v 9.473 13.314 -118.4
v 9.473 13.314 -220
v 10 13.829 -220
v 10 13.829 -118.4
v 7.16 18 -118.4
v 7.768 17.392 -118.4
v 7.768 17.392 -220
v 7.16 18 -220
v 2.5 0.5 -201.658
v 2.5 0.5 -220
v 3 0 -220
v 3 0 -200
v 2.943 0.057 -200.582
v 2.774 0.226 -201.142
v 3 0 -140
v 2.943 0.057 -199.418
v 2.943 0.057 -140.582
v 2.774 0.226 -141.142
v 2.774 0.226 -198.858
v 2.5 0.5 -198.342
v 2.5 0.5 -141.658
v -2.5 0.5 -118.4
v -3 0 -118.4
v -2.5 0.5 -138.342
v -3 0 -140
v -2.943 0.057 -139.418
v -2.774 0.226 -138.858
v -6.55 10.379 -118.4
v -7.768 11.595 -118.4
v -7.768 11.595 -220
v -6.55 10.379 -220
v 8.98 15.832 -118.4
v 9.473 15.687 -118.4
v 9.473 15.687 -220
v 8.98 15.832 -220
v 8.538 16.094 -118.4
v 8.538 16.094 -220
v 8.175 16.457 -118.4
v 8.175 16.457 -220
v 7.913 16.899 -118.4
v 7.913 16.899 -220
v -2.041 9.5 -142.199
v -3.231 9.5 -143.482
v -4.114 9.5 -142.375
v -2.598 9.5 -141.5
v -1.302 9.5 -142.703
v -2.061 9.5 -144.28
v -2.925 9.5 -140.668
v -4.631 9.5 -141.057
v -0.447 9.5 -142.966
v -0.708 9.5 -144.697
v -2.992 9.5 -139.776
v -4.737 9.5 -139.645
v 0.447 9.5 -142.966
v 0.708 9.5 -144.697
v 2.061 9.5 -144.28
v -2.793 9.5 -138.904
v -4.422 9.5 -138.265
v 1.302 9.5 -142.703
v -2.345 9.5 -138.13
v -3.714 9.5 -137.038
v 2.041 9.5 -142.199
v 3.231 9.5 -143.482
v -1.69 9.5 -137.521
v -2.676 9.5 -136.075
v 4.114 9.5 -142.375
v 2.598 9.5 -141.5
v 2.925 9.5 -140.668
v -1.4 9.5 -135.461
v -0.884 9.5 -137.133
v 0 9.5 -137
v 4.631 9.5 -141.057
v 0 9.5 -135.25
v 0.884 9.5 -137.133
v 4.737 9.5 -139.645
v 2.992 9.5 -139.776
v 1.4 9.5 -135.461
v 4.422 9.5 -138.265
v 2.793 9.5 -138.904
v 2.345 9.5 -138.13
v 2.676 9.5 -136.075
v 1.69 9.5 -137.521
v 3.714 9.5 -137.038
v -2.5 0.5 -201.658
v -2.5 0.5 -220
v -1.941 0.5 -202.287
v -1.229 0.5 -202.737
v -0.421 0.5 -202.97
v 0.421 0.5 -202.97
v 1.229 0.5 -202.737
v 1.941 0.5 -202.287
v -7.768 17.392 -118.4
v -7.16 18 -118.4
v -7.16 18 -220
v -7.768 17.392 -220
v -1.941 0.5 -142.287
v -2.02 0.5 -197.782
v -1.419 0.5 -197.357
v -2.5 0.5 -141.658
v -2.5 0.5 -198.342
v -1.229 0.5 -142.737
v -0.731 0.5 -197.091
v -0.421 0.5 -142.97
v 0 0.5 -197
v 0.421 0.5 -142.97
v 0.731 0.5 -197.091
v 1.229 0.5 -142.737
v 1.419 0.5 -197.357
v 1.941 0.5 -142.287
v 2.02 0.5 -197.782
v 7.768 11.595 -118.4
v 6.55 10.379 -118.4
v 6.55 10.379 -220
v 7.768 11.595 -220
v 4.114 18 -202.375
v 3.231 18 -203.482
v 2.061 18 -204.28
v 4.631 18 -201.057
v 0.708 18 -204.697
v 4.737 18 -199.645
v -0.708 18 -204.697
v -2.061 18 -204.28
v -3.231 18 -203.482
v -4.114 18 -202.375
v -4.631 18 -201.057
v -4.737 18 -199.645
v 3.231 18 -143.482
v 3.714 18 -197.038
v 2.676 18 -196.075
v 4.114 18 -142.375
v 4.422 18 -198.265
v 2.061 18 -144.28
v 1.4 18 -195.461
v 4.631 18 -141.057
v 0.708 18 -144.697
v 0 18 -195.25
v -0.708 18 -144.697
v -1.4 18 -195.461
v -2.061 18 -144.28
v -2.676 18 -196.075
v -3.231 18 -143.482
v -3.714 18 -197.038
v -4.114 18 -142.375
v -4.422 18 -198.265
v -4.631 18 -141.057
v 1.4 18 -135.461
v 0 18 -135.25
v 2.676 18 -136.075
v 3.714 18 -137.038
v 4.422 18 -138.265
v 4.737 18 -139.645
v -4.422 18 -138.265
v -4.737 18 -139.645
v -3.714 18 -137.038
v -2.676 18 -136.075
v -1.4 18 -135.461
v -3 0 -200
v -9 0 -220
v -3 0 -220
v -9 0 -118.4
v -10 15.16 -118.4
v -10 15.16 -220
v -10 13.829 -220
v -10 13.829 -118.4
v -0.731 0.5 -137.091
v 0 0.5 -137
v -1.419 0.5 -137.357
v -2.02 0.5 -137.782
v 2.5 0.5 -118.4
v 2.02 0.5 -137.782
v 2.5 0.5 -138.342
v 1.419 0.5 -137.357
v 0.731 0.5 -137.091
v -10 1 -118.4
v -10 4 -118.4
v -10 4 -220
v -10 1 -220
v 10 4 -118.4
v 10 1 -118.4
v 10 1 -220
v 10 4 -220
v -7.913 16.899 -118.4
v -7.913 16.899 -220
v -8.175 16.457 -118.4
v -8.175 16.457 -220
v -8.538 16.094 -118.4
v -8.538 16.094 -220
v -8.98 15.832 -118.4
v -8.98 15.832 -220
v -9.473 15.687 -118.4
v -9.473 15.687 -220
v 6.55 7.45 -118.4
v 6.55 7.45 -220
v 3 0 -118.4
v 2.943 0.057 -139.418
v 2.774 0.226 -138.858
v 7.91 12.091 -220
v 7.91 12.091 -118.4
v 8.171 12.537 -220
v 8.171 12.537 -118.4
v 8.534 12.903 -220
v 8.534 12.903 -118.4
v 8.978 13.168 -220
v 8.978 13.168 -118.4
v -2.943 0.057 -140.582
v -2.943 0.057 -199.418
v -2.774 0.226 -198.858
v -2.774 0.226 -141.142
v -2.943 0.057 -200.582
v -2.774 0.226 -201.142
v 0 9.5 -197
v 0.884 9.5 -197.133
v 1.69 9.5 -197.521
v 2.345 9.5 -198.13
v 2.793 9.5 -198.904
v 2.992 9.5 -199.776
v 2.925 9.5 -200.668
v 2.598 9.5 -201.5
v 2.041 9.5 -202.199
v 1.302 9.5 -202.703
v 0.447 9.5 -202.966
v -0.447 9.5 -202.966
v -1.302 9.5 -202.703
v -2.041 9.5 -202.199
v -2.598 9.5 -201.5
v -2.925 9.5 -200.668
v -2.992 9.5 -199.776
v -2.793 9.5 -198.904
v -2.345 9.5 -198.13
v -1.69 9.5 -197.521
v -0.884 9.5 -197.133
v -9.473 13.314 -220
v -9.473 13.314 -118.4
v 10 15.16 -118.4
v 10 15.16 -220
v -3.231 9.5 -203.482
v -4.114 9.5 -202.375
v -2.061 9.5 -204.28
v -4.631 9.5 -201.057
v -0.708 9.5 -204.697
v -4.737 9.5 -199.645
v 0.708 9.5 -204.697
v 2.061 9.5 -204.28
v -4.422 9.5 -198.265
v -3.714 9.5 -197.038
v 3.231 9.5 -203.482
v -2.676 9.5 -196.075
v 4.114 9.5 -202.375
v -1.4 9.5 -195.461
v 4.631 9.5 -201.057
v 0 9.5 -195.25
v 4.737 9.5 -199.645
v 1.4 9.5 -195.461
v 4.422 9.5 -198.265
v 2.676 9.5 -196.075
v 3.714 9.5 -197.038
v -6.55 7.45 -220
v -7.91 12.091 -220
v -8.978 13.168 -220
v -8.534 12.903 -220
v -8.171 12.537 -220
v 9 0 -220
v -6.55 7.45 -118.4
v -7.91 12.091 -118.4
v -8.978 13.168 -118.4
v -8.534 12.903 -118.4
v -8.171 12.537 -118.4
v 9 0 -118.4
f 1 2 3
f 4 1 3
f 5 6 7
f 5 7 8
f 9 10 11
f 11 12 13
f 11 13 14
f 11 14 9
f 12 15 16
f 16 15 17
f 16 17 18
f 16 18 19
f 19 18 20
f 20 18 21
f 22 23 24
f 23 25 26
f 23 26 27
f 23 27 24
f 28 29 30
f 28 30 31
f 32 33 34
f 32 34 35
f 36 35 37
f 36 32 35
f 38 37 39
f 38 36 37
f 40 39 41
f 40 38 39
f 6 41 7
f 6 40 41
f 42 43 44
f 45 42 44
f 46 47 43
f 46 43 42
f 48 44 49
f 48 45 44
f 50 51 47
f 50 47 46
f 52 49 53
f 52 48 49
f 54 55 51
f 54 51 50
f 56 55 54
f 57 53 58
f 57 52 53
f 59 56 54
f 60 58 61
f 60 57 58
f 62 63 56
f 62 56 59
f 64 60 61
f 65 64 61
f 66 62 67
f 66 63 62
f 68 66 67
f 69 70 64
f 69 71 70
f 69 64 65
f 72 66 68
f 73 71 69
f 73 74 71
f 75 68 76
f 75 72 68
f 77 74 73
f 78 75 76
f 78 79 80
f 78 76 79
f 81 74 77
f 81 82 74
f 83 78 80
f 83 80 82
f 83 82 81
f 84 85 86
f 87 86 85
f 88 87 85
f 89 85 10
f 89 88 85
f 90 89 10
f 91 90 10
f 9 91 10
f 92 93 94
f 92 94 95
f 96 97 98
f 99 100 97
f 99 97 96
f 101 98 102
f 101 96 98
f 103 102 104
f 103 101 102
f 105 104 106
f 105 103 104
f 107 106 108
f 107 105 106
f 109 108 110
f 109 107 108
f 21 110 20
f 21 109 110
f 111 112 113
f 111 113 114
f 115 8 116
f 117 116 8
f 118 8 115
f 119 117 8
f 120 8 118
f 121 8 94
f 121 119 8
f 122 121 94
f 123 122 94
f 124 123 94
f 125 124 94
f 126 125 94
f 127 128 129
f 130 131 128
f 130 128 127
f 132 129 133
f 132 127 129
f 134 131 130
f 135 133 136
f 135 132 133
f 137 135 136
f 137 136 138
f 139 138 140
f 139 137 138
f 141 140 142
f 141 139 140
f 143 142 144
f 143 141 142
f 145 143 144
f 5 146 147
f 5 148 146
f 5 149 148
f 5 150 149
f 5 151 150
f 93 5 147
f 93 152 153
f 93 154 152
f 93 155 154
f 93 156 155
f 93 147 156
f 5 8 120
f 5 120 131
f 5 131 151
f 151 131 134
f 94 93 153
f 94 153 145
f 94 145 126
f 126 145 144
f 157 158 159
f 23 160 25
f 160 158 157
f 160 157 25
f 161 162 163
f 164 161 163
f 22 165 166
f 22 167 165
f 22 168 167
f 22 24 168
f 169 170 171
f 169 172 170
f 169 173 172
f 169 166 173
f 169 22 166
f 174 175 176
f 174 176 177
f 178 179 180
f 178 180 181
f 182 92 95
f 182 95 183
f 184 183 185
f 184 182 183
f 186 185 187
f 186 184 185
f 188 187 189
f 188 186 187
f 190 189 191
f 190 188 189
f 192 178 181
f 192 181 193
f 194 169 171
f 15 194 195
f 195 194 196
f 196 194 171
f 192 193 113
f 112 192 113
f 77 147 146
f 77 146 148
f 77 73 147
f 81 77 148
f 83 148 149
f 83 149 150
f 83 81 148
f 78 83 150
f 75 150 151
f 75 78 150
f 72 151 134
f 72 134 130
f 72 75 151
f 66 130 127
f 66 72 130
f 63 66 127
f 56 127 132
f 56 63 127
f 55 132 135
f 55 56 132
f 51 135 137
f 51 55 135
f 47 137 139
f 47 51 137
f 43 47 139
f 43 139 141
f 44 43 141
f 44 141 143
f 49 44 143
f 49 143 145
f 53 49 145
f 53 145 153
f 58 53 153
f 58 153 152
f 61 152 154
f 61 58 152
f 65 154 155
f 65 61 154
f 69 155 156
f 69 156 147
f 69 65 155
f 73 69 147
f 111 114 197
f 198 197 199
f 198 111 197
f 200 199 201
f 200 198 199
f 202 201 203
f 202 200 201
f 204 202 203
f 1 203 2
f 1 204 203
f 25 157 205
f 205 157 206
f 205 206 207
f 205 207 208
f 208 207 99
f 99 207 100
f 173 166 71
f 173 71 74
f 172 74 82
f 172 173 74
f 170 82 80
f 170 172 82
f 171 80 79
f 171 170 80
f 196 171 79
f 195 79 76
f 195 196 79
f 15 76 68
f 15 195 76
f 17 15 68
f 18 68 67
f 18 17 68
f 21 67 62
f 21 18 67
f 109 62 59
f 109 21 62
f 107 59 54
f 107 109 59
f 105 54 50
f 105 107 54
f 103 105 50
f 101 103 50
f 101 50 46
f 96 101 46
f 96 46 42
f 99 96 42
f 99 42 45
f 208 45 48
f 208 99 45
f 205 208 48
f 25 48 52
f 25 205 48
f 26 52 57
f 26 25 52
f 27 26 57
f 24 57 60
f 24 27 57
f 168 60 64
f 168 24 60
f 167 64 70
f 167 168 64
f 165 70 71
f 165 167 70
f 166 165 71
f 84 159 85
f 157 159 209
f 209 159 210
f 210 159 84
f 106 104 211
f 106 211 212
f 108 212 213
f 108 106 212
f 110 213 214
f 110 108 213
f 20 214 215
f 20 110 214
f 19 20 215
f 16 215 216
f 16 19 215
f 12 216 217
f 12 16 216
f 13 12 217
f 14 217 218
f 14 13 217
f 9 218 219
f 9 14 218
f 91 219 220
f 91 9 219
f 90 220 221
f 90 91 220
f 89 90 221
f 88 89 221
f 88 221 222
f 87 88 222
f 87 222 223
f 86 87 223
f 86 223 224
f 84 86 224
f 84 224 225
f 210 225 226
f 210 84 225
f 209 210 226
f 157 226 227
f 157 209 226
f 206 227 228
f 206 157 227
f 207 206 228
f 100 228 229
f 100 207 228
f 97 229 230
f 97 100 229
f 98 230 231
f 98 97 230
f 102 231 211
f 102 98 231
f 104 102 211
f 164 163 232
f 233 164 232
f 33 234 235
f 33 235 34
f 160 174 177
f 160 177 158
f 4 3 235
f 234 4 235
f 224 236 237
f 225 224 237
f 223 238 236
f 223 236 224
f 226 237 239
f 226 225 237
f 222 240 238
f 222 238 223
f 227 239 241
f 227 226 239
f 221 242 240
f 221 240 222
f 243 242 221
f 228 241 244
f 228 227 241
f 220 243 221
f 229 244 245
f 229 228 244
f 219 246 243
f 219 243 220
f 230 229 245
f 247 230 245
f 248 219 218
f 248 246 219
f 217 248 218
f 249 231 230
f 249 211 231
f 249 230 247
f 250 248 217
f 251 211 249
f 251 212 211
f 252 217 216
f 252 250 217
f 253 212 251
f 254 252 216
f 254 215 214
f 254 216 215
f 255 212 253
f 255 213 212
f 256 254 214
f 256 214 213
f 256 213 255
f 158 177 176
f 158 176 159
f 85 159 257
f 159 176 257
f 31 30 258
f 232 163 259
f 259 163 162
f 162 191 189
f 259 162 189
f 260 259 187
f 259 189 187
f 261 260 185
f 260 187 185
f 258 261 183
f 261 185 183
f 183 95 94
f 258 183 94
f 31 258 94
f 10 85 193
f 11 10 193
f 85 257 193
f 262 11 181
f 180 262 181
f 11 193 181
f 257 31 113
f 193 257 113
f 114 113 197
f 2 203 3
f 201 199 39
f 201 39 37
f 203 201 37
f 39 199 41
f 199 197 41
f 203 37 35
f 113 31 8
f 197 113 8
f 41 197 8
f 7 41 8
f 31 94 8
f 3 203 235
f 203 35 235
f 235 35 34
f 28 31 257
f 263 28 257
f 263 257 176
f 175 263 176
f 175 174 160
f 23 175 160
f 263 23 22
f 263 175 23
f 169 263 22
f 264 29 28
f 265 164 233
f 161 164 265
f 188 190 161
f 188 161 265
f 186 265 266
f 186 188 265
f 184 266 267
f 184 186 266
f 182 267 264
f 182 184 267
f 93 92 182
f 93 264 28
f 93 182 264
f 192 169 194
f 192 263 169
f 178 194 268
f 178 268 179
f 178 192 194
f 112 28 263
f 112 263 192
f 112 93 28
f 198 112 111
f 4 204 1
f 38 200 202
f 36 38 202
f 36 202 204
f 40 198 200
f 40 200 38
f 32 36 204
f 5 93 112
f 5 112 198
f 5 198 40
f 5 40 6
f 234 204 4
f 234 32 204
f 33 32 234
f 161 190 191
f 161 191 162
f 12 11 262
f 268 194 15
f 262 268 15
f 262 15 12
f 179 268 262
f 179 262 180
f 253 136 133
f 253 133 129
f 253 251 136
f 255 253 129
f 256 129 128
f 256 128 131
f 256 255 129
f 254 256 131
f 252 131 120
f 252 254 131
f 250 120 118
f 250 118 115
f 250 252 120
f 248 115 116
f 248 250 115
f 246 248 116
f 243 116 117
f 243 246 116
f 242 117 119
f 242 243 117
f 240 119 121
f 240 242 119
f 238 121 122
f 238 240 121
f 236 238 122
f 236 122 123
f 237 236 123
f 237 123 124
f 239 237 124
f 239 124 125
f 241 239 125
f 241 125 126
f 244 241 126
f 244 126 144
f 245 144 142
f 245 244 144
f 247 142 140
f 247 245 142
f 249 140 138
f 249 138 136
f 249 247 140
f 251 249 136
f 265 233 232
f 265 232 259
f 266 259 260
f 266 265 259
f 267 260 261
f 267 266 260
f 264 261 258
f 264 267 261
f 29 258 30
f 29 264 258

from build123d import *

# Parameters (mm, degrees)
EXTRUDE1_DEPTH     = 220
LPATTERN1_COUNT    = 4
LPATTERN1_PITCH    = 60
SKETCH3_R          = 82.349198064
CUT_EXTRUDE1_DEPTH = 118.39956


with BuildPart() as part:
    # Sketch1 → Extrude1 (new body)
    with BuildSketch(Plane(origin=(-20, 0, 0), x_dir=(1, 0, 0), z_dir=(0, 0, 1))):
        with BuildLine():
            Line((10, 4.000077248), (10, 1))
            Line((10, 1), (11, 0))
            Line((11, 0), (17, 0))
            Line((17, 0), (17.5, 0.5))
            Line((17.5, 0.5), (22.5, 0.5))
            Line((22.5, 0.5), (23, 0))
            Line((23, 0), (29, 0))
            Line((29, 0), (30, 1))
            Line((30, 1), (30, 4.000077248))
            Line((30, 4.000077248), (26.550048828, 7.449951172))
            Line((26.550048828, 7.449951172), (26.550048828, 10.379235268))
            Line((26.550048828, 10.379235268), (27.767930373, 11.595131504))
            ThreePointArc((27.767930373, 11.595131504), (28.341068744, 12.731631743), (29.472673258, 13.314376637))
            Line((29.472673258, 13.314376637), (30, 13.82918644))
            Line((30, 13.82918644), (30, 15.160037041))
            Line((30, 15.160037041), (29.472673258, 15.687363783))
            ThreePointArc((29.472673258, 15.687363783), (28.344874488, 16.264307267), (27.767930373, 17.392105714))
            Line((27.767930373, 17.392105714), (27.160036564, 18))
            Line((27.160036564, 18), (12.839963436, 18))
            Line((12.839963436, 18), (12.232069627, 17.392105714))
            ThreePointArc((12.232069627, 17.392105714), (11.655125512, 16.264307267), (10.527326742, 15.687363783))
            Line((10.527326742, 15.687363783), (10, 15.160037041))
            Line((10, 15.160037041), (10, 13.82918644))
            Line((10, 13.82918644), (10.527326742, 13.314376637))
            ThreePointArc((10.527326742, 13.314376637), (11.658931256, 12.731631743), (12.232069627, 11.595131504))
            Line((12.232069627, 11.595131504), (13.449951172, 10.379235268))
            Line((13.449951172, 10.379235268), (13.449951172, 7.449951172))
            Line((13.449951172, 7.449951172), (10, 4.000077248))
        make_face()
    extrude(amount=-EXTRUDE1_DEPTH)

    # Sketch2 → Cut-Revolve1 (revolve, cut)
    with BuildSketch(Plane(origin=(0, 0, 0), x_dir=(0, 0, -1), z_dir=(1, 0, 0))):
        Polygon((20, 18), (24.75, 18), (24.75, 9.5), (23, 9.5), (23, 0), (20, 0), align=None)
    cut_revolve1 = revolve(axis=Axis((0, 0, -20), (0, 1, 0)), mode=Mode.SUBTRACT)

    # LPattern1: Cut-Revolve1 ×4
    with Locations(*[(0, 0, -i * LPATTERN1_PITCH) for i in range(1, LPATTERN1_COUNT)]):
        add(cut_revolve1, mode=Mode.SUBTRACT)

    # Sketch3 → Cut-Extrude1 (cut)
    with BuildSketch(Plane(origin=(7.767930373, 17.392105714, 0), x_dir=(1, 0, 0), z_dir=(0, 0, 1))):
        with Locations((-44.089026553, 19.698119616)):
            Circle(SKETCH3_R)
    extrude(amount=-CUT_EXTRUDE1_DEPTH, mode=Mode.SUBTRACT)


solid = part.part
